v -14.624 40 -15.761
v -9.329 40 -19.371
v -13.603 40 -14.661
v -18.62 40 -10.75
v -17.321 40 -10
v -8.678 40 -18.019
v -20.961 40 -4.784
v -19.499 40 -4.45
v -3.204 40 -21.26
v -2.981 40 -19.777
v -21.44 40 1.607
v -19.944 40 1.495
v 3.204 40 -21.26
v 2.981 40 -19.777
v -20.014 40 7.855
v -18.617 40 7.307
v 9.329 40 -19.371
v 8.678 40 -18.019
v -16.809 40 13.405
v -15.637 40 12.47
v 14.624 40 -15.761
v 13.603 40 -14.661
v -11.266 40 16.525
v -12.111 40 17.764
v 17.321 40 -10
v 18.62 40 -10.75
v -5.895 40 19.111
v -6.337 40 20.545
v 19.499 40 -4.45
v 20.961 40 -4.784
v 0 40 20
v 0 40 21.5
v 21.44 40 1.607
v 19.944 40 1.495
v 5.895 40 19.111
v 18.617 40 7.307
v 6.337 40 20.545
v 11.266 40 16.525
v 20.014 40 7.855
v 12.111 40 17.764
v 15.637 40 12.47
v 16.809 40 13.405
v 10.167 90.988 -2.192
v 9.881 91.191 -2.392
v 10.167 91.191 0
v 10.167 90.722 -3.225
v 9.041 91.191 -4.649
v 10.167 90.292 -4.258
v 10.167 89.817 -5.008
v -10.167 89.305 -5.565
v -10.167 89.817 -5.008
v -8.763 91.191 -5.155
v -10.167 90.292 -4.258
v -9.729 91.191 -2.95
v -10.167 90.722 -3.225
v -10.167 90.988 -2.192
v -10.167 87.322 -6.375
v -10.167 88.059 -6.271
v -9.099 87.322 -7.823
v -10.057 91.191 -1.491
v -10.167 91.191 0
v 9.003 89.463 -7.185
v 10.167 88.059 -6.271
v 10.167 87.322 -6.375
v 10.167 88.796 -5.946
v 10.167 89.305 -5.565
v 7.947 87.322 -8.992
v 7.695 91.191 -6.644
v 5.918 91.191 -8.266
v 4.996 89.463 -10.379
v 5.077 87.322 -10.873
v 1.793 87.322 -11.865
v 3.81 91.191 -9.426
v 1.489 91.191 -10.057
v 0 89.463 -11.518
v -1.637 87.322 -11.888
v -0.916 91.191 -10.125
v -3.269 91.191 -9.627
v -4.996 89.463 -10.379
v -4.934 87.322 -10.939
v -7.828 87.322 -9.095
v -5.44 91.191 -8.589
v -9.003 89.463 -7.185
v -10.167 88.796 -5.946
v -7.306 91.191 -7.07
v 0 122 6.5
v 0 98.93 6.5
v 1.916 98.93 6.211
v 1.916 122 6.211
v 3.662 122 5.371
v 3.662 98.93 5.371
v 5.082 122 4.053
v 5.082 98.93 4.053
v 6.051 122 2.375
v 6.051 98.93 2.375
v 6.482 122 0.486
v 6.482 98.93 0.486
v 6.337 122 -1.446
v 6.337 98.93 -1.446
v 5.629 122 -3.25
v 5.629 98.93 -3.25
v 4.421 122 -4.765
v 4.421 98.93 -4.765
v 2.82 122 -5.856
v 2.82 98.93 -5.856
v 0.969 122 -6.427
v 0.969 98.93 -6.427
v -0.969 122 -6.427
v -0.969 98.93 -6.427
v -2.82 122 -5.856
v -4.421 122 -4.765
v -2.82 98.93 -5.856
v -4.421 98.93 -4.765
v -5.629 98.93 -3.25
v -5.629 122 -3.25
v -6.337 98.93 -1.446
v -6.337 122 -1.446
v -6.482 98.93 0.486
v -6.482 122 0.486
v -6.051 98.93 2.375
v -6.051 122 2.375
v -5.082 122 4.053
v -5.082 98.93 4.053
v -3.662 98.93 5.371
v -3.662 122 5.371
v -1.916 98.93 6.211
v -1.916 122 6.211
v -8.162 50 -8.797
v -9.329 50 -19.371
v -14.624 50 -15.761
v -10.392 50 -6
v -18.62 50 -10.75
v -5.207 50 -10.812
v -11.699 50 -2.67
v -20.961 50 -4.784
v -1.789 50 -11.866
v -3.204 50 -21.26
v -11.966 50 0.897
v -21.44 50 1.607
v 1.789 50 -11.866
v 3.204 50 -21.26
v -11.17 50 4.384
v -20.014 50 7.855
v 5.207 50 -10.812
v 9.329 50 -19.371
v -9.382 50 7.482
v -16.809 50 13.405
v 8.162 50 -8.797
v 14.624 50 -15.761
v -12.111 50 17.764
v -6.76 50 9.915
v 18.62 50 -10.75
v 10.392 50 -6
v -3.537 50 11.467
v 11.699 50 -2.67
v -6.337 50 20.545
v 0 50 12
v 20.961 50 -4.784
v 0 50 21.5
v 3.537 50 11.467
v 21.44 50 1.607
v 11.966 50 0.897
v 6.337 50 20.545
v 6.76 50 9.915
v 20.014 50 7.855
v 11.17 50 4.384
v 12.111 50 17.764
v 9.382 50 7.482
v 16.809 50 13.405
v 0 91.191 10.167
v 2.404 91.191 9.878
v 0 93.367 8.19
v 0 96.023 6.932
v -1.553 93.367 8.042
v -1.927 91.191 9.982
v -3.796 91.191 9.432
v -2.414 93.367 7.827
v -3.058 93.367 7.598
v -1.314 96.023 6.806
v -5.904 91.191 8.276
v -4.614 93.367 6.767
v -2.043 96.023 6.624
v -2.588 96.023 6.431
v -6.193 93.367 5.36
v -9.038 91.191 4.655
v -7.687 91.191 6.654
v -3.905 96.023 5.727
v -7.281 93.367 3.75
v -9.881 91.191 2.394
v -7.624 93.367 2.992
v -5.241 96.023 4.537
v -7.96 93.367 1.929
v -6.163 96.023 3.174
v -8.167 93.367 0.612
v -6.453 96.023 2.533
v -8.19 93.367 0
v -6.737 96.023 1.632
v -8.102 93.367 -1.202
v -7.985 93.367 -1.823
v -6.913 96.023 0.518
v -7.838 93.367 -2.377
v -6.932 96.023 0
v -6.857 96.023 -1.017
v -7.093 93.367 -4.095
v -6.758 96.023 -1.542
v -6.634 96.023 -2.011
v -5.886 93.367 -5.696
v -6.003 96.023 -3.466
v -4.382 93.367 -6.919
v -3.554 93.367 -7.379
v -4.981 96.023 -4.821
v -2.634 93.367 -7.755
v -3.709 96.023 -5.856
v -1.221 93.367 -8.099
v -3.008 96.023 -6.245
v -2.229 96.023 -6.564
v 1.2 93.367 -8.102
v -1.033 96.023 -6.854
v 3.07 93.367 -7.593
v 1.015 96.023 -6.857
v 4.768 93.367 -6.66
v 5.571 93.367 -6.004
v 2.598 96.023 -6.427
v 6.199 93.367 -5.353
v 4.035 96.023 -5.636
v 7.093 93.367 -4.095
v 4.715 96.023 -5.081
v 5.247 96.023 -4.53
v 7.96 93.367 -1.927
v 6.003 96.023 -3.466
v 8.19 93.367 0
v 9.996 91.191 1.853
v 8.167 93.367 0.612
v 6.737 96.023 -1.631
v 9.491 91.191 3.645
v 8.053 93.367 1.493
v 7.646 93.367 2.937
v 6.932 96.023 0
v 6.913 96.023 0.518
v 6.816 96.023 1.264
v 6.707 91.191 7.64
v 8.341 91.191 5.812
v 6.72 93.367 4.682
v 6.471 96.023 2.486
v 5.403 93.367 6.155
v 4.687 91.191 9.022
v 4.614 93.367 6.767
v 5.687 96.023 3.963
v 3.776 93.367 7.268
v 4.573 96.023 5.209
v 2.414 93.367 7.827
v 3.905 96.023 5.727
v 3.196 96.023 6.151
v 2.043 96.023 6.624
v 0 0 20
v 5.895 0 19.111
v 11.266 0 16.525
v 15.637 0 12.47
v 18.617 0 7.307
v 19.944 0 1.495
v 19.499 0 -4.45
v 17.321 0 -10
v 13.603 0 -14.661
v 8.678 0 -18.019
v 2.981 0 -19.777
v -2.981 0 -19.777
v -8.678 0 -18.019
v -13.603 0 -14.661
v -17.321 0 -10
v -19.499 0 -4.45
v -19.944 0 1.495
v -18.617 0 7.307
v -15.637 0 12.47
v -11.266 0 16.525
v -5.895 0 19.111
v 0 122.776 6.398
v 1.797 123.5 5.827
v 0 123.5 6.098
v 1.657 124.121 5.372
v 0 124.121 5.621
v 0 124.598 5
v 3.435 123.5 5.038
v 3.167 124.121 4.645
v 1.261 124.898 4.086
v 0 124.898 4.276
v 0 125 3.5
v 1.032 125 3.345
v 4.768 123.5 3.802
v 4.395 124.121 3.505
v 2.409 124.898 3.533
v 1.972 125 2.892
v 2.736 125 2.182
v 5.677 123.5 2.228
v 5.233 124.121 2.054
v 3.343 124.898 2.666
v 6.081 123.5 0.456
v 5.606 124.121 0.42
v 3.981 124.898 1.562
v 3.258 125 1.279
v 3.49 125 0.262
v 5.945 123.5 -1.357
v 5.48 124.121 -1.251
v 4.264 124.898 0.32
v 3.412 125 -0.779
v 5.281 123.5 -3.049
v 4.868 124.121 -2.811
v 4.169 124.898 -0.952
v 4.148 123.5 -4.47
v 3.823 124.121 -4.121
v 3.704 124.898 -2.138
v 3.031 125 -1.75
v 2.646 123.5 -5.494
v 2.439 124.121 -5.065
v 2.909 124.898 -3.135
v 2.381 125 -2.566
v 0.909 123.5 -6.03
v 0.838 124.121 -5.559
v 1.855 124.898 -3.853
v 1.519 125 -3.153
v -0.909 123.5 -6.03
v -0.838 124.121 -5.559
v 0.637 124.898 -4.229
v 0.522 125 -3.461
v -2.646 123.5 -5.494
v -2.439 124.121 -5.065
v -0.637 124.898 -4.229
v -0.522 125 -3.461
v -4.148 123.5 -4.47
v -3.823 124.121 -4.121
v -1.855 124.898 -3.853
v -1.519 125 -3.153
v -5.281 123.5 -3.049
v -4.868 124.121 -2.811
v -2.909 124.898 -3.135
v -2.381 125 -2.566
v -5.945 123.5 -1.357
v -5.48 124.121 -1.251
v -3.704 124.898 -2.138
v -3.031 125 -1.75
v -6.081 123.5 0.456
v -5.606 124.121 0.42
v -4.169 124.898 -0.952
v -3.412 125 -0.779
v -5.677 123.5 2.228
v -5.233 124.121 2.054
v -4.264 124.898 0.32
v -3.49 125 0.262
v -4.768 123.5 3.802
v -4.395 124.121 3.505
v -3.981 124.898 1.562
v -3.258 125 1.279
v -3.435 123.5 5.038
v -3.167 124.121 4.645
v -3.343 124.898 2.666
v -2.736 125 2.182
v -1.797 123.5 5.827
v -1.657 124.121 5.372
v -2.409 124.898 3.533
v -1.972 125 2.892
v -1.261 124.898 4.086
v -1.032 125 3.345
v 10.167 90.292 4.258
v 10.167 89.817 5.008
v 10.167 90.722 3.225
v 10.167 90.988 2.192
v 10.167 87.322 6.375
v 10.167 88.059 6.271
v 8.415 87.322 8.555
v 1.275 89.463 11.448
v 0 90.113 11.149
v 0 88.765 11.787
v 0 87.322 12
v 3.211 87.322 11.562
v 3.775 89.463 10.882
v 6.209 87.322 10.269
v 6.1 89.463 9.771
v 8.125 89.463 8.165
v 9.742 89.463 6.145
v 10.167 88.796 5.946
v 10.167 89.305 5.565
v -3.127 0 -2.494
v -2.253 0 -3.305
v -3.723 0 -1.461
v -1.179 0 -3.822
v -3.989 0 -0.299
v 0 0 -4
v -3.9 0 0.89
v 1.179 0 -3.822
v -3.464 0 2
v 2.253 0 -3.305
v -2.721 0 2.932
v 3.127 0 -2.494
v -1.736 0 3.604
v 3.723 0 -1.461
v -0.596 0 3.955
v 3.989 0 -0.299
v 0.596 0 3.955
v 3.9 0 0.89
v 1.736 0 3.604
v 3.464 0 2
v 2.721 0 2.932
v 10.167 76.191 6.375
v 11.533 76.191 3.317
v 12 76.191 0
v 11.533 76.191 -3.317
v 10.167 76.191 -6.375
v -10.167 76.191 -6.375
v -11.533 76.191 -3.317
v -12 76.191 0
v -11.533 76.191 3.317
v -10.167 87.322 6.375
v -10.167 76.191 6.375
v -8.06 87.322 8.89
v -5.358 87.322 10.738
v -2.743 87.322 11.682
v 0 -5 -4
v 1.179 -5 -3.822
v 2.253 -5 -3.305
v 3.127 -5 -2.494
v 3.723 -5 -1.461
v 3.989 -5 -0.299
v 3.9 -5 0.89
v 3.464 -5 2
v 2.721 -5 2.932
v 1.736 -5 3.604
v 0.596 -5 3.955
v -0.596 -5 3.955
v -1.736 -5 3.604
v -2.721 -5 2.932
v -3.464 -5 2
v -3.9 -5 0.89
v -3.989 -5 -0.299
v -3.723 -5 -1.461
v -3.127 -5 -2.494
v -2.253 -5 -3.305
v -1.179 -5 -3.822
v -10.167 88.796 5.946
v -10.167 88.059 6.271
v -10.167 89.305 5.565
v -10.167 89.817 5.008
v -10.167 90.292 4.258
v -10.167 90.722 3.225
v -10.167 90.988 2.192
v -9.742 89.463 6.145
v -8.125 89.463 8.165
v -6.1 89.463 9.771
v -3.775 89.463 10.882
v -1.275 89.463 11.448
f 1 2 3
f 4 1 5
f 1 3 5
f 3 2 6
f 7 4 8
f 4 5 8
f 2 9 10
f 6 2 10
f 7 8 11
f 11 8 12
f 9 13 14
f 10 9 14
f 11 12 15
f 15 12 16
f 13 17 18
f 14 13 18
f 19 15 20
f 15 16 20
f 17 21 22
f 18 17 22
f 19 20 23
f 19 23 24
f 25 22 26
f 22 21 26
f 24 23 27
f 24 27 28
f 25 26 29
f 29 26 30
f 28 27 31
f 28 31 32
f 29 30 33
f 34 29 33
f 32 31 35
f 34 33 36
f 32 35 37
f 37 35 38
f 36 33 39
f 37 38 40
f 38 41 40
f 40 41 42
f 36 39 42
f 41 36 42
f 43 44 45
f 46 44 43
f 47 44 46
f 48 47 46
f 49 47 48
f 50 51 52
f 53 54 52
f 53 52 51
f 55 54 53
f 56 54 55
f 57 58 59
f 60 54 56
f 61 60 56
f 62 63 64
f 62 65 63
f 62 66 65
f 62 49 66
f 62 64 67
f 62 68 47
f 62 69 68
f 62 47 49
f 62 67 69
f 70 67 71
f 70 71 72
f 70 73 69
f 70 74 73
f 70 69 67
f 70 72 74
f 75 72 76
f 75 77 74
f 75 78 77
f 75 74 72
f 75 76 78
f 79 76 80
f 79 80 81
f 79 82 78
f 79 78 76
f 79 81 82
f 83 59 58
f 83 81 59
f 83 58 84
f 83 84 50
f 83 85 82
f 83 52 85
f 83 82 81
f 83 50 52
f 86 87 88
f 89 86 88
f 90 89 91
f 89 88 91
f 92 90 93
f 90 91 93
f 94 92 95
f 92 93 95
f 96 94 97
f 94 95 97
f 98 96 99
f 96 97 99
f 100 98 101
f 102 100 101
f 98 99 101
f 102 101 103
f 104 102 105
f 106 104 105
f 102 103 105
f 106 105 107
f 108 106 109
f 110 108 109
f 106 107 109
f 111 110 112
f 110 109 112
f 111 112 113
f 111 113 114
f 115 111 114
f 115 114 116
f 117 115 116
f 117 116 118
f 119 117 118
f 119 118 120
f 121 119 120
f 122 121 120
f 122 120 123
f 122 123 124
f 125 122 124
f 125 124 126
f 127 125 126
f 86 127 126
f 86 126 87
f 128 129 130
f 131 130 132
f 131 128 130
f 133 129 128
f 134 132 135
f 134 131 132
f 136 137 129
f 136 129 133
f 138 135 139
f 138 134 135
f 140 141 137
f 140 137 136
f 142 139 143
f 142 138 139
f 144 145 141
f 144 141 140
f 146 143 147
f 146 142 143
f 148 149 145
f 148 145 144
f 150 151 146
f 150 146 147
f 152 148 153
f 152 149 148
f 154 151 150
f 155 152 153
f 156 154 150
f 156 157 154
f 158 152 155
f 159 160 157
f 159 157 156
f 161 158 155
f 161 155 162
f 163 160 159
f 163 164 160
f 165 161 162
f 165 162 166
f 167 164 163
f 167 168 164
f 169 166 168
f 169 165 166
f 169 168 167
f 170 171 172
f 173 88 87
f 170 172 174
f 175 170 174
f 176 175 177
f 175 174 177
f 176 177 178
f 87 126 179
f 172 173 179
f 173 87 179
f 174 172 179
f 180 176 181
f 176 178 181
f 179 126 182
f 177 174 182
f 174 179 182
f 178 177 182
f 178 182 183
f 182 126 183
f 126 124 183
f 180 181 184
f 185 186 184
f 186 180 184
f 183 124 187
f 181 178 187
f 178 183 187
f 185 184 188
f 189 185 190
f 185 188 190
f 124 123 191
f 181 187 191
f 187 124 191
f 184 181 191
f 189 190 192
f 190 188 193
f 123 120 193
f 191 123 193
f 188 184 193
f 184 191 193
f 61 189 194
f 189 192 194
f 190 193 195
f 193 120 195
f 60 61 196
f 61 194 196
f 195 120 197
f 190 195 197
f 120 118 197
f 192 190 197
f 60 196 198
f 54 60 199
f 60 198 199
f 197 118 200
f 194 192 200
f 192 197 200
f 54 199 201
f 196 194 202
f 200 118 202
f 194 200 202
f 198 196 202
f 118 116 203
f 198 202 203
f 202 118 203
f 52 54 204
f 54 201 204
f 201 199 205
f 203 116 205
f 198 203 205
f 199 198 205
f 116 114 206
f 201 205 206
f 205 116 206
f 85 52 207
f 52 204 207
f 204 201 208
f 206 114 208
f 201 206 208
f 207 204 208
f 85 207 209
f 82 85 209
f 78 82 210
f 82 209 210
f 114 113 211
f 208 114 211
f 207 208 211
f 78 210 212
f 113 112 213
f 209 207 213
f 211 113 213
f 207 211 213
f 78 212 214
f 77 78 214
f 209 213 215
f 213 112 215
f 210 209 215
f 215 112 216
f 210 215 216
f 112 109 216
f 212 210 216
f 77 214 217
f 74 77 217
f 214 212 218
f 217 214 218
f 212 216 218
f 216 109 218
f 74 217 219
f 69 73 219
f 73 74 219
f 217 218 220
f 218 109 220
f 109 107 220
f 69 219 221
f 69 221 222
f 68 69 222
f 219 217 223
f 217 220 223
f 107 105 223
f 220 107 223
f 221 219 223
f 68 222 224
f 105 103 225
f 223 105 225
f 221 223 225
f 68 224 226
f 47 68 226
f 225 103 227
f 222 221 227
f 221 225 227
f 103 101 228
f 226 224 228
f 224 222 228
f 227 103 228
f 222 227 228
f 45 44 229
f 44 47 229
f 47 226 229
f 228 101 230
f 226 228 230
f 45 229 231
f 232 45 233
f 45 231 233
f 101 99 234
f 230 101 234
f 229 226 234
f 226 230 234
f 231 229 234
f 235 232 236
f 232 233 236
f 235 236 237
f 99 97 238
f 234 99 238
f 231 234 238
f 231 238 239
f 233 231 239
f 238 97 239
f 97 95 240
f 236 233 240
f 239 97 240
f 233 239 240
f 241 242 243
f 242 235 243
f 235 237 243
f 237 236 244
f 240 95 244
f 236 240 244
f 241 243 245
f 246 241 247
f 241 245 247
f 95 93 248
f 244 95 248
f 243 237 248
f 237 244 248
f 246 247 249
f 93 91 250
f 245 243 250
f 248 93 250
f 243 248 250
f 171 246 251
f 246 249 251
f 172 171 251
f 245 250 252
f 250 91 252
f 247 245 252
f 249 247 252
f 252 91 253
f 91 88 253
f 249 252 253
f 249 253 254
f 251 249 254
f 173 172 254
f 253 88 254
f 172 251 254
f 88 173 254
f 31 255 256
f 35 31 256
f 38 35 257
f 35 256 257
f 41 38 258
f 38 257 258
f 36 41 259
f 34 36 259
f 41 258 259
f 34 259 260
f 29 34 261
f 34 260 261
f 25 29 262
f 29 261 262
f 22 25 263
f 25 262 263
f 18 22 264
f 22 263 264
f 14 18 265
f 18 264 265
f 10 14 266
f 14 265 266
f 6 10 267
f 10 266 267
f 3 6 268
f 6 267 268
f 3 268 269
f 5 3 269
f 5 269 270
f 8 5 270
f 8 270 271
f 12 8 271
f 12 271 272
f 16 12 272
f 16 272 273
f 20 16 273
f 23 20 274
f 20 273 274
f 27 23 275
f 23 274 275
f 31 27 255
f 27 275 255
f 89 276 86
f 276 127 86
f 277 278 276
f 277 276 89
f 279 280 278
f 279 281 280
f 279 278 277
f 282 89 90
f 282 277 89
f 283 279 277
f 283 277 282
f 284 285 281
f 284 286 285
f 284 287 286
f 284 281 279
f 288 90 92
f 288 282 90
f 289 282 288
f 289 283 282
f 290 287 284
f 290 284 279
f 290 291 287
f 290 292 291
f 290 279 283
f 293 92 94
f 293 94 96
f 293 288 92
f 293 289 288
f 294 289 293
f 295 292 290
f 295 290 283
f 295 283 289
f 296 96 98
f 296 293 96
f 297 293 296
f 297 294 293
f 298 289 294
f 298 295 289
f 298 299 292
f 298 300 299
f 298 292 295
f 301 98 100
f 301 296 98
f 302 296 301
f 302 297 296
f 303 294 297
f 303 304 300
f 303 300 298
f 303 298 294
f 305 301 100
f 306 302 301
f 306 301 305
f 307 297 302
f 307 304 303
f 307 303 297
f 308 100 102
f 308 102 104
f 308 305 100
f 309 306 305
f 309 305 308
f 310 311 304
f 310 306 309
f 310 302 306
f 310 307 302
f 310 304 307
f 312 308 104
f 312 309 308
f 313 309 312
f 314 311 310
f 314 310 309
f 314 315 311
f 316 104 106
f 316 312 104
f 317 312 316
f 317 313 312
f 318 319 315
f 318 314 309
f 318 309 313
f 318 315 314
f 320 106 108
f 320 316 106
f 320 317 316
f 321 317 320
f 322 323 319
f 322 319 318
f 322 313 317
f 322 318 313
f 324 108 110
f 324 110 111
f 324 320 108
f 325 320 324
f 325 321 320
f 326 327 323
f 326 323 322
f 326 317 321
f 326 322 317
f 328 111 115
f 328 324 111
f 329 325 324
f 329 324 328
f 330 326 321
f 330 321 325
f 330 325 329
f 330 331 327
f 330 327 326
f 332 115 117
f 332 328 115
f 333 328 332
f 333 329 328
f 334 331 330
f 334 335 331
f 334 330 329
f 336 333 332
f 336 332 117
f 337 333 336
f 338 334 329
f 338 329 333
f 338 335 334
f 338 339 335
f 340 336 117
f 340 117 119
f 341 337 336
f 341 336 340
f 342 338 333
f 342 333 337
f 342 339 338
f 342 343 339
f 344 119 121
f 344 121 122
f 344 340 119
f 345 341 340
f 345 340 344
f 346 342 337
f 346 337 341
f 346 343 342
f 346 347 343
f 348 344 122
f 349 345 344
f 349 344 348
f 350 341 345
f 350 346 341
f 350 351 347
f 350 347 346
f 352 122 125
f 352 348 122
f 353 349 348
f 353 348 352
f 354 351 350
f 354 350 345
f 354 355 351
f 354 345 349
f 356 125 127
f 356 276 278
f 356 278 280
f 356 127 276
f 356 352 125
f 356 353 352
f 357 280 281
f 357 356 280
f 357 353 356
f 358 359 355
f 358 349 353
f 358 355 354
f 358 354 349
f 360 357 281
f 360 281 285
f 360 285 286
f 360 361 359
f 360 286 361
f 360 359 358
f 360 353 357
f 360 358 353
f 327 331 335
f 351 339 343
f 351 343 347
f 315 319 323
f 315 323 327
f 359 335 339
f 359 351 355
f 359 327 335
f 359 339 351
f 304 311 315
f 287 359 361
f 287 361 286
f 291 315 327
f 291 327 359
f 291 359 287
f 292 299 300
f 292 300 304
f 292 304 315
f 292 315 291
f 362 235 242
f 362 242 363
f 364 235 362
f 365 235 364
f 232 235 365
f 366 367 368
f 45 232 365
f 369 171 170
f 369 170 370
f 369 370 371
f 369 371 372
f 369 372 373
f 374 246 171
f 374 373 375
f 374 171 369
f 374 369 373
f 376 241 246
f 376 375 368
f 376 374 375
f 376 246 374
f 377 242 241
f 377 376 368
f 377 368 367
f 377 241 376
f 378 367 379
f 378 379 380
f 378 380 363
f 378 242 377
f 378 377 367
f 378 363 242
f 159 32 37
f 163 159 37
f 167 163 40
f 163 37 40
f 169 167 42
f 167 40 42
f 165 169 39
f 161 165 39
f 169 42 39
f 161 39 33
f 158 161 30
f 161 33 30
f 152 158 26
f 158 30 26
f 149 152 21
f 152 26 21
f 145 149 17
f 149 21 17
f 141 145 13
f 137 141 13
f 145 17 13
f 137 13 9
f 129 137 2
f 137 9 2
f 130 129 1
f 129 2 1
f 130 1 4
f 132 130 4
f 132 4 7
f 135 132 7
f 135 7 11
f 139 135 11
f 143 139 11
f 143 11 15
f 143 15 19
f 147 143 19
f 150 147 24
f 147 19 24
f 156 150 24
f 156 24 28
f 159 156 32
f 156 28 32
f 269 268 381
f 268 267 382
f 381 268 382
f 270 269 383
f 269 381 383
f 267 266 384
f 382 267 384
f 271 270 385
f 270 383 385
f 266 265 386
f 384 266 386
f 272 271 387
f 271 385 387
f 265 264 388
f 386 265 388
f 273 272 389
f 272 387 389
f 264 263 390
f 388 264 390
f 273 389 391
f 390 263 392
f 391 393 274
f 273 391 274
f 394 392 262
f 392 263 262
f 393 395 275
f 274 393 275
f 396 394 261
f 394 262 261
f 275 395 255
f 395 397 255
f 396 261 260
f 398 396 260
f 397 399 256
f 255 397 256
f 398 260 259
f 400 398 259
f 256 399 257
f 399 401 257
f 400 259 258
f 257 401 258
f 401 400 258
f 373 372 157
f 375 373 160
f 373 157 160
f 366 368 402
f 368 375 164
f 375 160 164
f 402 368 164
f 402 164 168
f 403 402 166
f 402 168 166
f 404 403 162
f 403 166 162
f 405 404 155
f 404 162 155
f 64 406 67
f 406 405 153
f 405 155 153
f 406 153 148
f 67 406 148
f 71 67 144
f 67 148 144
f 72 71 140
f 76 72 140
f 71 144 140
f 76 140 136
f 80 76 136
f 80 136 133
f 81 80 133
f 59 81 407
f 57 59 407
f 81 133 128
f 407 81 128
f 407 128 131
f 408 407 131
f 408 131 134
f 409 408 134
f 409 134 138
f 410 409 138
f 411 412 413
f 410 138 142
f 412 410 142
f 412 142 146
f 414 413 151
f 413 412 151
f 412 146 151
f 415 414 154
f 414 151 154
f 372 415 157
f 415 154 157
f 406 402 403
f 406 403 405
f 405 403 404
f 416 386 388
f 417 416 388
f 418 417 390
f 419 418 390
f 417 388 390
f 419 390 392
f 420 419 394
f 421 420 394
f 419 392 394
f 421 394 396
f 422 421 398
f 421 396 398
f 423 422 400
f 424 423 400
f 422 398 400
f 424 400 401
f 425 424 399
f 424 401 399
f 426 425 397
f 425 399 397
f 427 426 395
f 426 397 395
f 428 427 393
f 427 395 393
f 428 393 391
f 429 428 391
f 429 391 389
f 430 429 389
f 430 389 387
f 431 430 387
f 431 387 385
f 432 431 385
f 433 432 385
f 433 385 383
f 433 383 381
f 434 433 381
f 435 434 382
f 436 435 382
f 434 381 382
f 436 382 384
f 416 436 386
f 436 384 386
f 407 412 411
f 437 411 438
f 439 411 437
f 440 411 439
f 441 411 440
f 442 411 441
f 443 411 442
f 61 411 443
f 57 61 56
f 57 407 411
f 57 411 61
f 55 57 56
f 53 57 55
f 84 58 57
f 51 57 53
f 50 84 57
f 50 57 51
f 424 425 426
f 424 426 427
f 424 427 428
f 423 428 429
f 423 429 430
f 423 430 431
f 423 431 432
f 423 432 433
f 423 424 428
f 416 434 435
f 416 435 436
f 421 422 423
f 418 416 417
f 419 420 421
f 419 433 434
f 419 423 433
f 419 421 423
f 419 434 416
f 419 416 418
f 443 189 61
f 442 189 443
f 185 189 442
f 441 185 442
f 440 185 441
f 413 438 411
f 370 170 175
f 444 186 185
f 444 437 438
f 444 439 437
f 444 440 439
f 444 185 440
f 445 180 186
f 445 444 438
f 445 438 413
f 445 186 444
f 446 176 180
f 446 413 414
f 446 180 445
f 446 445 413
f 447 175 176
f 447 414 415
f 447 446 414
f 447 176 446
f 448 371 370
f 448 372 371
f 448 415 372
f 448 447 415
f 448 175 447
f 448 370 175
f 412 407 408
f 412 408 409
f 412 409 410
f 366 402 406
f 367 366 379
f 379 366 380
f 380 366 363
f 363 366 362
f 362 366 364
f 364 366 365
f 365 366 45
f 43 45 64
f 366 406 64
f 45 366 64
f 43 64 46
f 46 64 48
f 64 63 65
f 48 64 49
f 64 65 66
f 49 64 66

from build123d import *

# Parameters (mm, degrees)
SKETCH1_R               = 20
BOSS_EXTRUDE1_DEPTH     = 40
SKETCH2_R               = 21.5
BOSS_EXTRUDE2_DEPTH     = 10
SKETCH3_R               = 6.5
BOSS_EXTRUDE3_DEPTH     = 75
SKETCH4_R               = 12
BOSS_EXTRUDE4_DEPTH     = 40
FILLET1_R               = 10
FILLET2_R               = 5
FILLET3_R               = 3
SKETCH5_R               = 4
BOSS_EXTRUDE5_DEPTH     = 5
CUT_EXTRUDE1_DEPTH      = 129.64486008
CUT_EXTRUDE1_DEPTH_BACK = 129.64486008
SKETCH6_W               = 1.833333333
SKETCH6_H               = 15


with BuildPart() as part:
    # Sketch1 → Boss-Extrude1 (new body)
    with BuildSketch(Plane(origin=(0, 0, 0), x_dir=(1, 0, 0), z_dir=(0, 1, 0))):
        with Locations(Location((0, 0, 0), (0, 0, 270))):
            Circle(SKETCH1_R)
    extrude(amount=BOSS_EXTRUDE1_DEPTH)

    # Sketch2 → Boss-Extrude2 (add)
    with BuildSketch(Plane(origin=(0, 40, 0), x_dir=(1, 0, 0), z_dir=(0, 1, 0))):
        with Locations(Location((0, 0, 0), (0, 0, 270))):
            Circle(SKETCH2_R)
    extrude(amount=BOSS_EXTRUDE2_DEPTH)

    # Sketch3 → Boss-Extrude3 (add)
    with BuildSketch(Plane(origin=(0, 50, 0), x_dir=(1, 0, 0), z_dir=(0, 1, 0))):
        with Locations(Location((0, 0, 0), (0, 0, 270))):
            Circle(SKETCH3_R)
    extrude(amount=BOSS_EXTRUDE3_DEPTH)

    # Sketch4 → Boss-Extrude4 (add)
    with BuildSketch(Plane(origin=(0, 50, 0), x_dir=(1, 0, 0), z_dir=(0, 1, 0))):
        with Locations(Location((0, 0, 0), (0, 0, 270))):
            Circle(SKETCH4_R)
    extrude(amount=BOSS_EXTRUDE4_DEPTH)

    # Fillet1
    # the kernel refuses this fillet: 10 mm, written as the material it adds along each edge
    with BuildSketch(Plane(origin=(0, 90, 0), x_dir=(0, 0, 1), z_dir=(1, 0, 0))) as fillet1_piece_1:
        with BuildLine():
            CenterArc((16.5, -8.93028555), FILLET1_R, 116.74368395, 63.25631605)
            Line((6.5, -8.93028555), (6.3, -8.93028555))
            Line((6.3, -8.93028555), (6.3, 0))
            Line((6.3, 0), (6.5, 0.2))
            ThreePointArc((6.5, 0.2), (9.25, 0.2), (11.91, 0.178605711))
            Line((11.91, 0.178605711), (12, 0))
        make_face()
    revolve(axis=Axis((0, 90, 0), (0, -1, 0)))

    # Fillet2
    fillet2_edges = [part.edges().sort_by_distance(p)[0] for p in [
        (0, 90, -12),
    ]]
    fillet(fillet2_edges, radius=FILLET2_R)

    # Fillet3
    fillet3_edges = [part.edges().sort_by_distance(p)[0] for p in [
        (0, 125, -6.5),
    ]]
    fillet(fillet3_edges, radius=FILLET3_R)

    # Sketch5 → Boss-Extrude5 (add)
    with BuildSketch(Plane.XZ):
        with Locations(Location((0, 0, 0), (0, 0, 270))):
            Circle(SKETCH5_R)
    extrude(amount=BOSS_EXTRUDE5_DEPTH)

    # Sketch6 → Cut-Extrude1 (cut, two sides: drawn at the far end of the back side and taken through both)
    with BuildSketch(Plane.XY.offset(-CUT_EXTRUDE1_DEPTH_BACK)):
        with Locations((-11.083333334, 83.691494372)):
            Rectangle(SKETCH6_W, SKETCH6_H)
        with Locations((11.083333334, 83.691494372)):
            Rectangle(SKETCH6_W, SKETCH6_H)
    extrude(amount=CUT_EXTRUDE1_DEPTH + CUT_EXTRUDE1_DEPTH_BACK, mode=Mode.SUBTRACT)


solid = part.part
